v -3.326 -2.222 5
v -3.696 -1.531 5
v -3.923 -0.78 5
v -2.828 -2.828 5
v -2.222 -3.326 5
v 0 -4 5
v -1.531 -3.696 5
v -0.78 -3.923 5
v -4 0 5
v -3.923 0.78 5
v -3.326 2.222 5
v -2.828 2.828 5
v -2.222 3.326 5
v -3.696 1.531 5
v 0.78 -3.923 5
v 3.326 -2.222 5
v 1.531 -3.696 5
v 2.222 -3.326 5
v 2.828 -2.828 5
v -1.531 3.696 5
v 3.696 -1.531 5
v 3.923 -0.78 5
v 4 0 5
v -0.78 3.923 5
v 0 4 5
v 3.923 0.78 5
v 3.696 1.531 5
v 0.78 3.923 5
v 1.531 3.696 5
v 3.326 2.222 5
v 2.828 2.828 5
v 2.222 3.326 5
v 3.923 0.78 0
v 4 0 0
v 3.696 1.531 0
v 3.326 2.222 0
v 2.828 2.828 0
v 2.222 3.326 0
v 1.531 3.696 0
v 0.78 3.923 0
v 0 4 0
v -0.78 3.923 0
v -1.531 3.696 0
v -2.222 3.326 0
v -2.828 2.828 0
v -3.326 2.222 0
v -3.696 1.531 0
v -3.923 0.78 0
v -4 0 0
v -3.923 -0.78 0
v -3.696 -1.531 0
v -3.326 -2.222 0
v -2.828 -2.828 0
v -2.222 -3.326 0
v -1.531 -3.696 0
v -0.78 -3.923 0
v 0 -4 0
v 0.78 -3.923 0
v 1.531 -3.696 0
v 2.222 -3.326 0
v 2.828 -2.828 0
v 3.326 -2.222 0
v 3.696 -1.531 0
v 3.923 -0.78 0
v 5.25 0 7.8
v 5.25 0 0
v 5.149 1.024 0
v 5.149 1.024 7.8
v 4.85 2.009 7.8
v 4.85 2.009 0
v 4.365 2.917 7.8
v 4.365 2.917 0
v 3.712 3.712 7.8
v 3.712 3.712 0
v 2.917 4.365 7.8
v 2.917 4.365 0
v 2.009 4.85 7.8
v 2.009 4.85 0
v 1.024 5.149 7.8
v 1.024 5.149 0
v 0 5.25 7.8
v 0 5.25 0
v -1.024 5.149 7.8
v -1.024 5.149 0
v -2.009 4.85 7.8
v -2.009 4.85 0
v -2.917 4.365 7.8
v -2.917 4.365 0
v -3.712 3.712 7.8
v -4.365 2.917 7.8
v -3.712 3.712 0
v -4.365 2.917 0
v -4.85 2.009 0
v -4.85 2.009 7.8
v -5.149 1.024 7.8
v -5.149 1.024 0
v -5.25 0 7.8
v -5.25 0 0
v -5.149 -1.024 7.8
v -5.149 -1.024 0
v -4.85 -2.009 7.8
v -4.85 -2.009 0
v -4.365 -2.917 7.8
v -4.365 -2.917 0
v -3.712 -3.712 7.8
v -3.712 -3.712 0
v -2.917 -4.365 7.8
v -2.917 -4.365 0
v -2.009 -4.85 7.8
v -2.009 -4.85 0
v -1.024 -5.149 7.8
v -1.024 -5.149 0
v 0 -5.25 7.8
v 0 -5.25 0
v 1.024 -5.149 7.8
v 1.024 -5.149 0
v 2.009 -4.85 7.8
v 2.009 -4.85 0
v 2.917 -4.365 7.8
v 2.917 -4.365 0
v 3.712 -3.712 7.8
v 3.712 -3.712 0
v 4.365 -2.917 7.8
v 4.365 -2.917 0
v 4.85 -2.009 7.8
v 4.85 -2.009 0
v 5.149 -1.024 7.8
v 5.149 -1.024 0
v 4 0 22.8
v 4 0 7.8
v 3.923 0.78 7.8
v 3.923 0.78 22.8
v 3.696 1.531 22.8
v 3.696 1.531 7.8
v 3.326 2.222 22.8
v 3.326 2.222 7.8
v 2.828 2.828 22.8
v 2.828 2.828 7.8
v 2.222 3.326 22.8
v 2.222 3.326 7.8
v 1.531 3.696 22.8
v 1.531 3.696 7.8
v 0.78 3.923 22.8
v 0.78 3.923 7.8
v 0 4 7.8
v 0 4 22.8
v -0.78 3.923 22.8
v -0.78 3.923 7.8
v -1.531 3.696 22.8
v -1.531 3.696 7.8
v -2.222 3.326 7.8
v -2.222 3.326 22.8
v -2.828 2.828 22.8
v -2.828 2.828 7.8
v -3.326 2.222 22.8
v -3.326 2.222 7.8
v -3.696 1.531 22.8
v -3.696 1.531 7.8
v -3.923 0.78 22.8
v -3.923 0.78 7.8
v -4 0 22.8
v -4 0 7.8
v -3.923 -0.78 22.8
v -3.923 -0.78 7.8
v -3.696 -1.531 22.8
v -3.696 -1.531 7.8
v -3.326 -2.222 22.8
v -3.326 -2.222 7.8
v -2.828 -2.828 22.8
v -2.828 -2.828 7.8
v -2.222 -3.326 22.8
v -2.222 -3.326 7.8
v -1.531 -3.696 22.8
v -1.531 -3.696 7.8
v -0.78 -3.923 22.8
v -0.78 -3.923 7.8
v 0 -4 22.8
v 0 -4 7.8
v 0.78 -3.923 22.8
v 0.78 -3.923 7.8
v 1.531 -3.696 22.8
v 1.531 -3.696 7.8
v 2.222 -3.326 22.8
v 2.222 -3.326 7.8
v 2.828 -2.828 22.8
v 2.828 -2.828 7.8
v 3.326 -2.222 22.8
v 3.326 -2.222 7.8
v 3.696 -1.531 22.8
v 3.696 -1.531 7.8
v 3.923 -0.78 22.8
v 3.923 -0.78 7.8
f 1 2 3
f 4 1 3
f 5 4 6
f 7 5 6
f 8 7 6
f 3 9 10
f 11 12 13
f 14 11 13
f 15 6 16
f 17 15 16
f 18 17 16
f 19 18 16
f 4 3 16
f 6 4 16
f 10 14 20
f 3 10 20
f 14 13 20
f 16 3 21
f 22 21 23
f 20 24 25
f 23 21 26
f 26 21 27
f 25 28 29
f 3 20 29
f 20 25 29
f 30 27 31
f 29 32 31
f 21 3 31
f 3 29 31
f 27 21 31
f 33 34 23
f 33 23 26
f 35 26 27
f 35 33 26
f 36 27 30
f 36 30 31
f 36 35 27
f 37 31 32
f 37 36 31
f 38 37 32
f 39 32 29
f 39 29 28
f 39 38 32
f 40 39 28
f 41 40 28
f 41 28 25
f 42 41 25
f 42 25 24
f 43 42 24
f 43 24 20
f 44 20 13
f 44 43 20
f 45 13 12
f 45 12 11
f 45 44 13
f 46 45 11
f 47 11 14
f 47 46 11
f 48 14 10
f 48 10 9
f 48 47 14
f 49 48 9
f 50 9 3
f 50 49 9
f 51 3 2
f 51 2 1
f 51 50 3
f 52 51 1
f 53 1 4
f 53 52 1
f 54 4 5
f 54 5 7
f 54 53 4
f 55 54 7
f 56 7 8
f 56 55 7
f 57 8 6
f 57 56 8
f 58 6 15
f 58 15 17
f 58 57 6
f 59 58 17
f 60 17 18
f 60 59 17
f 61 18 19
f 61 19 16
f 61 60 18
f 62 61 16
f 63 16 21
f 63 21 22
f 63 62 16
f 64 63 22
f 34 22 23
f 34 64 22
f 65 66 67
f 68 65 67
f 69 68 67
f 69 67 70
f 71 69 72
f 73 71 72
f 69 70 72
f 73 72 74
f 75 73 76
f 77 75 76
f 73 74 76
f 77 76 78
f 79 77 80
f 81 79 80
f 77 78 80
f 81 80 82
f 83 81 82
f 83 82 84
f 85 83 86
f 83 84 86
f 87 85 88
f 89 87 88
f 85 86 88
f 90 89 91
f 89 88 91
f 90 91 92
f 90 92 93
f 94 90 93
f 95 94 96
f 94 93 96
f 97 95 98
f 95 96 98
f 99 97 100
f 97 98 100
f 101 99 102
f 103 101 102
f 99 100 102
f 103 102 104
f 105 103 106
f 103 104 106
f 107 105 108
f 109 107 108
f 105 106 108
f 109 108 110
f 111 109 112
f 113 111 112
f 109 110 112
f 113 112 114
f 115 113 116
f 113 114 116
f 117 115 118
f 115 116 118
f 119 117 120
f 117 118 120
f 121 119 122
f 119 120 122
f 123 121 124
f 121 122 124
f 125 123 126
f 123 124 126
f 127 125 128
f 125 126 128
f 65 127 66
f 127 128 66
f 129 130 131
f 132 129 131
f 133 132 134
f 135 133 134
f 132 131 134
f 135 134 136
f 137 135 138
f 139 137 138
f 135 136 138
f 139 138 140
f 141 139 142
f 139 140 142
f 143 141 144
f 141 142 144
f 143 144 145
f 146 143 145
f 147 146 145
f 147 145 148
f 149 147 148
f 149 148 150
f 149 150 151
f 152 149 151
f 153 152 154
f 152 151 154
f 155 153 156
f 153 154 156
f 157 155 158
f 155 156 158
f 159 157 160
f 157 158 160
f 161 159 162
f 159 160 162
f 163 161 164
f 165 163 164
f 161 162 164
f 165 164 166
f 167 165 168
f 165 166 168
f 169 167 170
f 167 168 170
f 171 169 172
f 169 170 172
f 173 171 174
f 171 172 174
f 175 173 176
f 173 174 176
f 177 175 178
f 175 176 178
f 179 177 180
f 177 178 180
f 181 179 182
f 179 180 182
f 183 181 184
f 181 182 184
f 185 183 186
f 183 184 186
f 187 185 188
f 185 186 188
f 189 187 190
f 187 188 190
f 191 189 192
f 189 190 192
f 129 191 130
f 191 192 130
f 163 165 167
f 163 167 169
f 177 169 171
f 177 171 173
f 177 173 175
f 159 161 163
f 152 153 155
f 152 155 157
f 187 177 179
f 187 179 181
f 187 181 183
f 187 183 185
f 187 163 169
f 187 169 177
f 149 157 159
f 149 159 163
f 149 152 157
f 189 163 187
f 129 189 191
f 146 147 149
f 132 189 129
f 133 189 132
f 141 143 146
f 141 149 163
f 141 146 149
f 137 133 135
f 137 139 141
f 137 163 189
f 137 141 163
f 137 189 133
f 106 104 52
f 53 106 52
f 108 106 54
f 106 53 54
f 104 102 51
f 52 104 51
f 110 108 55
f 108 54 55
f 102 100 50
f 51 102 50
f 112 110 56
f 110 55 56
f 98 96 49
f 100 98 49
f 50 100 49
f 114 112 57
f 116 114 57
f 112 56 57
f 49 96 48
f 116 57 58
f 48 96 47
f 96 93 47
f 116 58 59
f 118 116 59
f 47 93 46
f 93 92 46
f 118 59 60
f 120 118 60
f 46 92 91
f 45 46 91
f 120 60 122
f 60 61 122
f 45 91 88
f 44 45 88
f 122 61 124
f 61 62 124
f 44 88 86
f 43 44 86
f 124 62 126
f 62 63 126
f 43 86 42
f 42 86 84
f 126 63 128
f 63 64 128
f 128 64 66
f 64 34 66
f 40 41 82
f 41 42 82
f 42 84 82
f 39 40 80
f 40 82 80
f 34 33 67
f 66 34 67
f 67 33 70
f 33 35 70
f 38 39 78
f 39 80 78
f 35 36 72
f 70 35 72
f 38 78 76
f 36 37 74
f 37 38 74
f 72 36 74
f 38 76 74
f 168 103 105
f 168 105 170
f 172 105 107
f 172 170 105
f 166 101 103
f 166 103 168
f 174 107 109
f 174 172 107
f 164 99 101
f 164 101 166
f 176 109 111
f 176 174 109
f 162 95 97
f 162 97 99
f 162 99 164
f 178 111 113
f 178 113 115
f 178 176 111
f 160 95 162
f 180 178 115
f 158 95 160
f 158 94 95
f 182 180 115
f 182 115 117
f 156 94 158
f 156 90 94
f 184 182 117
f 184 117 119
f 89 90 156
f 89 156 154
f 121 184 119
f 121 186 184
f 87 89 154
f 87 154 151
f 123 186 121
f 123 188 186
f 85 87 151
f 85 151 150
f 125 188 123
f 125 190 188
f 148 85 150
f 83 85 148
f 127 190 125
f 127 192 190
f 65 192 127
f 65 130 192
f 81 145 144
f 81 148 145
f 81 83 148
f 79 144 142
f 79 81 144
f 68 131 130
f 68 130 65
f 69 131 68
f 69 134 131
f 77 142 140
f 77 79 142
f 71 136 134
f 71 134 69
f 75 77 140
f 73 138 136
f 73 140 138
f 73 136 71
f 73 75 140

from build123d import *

# Parameters (mm, degrees)
F0_R     = 5.25
F0_R_2   = 4
F1_DEPTH = 7.8
F2_DEPTH = 5
F3_R     = 4
F4_DEPTH = 15


with BuildPart() as f1:
    # F0 (on Top) → F1 (new body)
    with BuildSketch(Plane.XY):
        Circle(F0_R)
        Circle(F0_R_2, mode=Mode.SUBTRACT)
        Circle(F0_R_2)
    extrude(amount=F1_DEPTH)

    # F0 (on Top) → F2 (cut)
    with BuildSketch(Plane.XY):
        Circle(F0_R_2)
    extrude(amount=F2_DEPTH, mode=Mode.SUBTRACT)

    # F3 (on face) → F4 (join)
    with BuildSketch(Plane.XY.offset(7.8)):
        Circle(F3_R)
    extrude(amount=F4_DEPTH)


solid = f1.part
